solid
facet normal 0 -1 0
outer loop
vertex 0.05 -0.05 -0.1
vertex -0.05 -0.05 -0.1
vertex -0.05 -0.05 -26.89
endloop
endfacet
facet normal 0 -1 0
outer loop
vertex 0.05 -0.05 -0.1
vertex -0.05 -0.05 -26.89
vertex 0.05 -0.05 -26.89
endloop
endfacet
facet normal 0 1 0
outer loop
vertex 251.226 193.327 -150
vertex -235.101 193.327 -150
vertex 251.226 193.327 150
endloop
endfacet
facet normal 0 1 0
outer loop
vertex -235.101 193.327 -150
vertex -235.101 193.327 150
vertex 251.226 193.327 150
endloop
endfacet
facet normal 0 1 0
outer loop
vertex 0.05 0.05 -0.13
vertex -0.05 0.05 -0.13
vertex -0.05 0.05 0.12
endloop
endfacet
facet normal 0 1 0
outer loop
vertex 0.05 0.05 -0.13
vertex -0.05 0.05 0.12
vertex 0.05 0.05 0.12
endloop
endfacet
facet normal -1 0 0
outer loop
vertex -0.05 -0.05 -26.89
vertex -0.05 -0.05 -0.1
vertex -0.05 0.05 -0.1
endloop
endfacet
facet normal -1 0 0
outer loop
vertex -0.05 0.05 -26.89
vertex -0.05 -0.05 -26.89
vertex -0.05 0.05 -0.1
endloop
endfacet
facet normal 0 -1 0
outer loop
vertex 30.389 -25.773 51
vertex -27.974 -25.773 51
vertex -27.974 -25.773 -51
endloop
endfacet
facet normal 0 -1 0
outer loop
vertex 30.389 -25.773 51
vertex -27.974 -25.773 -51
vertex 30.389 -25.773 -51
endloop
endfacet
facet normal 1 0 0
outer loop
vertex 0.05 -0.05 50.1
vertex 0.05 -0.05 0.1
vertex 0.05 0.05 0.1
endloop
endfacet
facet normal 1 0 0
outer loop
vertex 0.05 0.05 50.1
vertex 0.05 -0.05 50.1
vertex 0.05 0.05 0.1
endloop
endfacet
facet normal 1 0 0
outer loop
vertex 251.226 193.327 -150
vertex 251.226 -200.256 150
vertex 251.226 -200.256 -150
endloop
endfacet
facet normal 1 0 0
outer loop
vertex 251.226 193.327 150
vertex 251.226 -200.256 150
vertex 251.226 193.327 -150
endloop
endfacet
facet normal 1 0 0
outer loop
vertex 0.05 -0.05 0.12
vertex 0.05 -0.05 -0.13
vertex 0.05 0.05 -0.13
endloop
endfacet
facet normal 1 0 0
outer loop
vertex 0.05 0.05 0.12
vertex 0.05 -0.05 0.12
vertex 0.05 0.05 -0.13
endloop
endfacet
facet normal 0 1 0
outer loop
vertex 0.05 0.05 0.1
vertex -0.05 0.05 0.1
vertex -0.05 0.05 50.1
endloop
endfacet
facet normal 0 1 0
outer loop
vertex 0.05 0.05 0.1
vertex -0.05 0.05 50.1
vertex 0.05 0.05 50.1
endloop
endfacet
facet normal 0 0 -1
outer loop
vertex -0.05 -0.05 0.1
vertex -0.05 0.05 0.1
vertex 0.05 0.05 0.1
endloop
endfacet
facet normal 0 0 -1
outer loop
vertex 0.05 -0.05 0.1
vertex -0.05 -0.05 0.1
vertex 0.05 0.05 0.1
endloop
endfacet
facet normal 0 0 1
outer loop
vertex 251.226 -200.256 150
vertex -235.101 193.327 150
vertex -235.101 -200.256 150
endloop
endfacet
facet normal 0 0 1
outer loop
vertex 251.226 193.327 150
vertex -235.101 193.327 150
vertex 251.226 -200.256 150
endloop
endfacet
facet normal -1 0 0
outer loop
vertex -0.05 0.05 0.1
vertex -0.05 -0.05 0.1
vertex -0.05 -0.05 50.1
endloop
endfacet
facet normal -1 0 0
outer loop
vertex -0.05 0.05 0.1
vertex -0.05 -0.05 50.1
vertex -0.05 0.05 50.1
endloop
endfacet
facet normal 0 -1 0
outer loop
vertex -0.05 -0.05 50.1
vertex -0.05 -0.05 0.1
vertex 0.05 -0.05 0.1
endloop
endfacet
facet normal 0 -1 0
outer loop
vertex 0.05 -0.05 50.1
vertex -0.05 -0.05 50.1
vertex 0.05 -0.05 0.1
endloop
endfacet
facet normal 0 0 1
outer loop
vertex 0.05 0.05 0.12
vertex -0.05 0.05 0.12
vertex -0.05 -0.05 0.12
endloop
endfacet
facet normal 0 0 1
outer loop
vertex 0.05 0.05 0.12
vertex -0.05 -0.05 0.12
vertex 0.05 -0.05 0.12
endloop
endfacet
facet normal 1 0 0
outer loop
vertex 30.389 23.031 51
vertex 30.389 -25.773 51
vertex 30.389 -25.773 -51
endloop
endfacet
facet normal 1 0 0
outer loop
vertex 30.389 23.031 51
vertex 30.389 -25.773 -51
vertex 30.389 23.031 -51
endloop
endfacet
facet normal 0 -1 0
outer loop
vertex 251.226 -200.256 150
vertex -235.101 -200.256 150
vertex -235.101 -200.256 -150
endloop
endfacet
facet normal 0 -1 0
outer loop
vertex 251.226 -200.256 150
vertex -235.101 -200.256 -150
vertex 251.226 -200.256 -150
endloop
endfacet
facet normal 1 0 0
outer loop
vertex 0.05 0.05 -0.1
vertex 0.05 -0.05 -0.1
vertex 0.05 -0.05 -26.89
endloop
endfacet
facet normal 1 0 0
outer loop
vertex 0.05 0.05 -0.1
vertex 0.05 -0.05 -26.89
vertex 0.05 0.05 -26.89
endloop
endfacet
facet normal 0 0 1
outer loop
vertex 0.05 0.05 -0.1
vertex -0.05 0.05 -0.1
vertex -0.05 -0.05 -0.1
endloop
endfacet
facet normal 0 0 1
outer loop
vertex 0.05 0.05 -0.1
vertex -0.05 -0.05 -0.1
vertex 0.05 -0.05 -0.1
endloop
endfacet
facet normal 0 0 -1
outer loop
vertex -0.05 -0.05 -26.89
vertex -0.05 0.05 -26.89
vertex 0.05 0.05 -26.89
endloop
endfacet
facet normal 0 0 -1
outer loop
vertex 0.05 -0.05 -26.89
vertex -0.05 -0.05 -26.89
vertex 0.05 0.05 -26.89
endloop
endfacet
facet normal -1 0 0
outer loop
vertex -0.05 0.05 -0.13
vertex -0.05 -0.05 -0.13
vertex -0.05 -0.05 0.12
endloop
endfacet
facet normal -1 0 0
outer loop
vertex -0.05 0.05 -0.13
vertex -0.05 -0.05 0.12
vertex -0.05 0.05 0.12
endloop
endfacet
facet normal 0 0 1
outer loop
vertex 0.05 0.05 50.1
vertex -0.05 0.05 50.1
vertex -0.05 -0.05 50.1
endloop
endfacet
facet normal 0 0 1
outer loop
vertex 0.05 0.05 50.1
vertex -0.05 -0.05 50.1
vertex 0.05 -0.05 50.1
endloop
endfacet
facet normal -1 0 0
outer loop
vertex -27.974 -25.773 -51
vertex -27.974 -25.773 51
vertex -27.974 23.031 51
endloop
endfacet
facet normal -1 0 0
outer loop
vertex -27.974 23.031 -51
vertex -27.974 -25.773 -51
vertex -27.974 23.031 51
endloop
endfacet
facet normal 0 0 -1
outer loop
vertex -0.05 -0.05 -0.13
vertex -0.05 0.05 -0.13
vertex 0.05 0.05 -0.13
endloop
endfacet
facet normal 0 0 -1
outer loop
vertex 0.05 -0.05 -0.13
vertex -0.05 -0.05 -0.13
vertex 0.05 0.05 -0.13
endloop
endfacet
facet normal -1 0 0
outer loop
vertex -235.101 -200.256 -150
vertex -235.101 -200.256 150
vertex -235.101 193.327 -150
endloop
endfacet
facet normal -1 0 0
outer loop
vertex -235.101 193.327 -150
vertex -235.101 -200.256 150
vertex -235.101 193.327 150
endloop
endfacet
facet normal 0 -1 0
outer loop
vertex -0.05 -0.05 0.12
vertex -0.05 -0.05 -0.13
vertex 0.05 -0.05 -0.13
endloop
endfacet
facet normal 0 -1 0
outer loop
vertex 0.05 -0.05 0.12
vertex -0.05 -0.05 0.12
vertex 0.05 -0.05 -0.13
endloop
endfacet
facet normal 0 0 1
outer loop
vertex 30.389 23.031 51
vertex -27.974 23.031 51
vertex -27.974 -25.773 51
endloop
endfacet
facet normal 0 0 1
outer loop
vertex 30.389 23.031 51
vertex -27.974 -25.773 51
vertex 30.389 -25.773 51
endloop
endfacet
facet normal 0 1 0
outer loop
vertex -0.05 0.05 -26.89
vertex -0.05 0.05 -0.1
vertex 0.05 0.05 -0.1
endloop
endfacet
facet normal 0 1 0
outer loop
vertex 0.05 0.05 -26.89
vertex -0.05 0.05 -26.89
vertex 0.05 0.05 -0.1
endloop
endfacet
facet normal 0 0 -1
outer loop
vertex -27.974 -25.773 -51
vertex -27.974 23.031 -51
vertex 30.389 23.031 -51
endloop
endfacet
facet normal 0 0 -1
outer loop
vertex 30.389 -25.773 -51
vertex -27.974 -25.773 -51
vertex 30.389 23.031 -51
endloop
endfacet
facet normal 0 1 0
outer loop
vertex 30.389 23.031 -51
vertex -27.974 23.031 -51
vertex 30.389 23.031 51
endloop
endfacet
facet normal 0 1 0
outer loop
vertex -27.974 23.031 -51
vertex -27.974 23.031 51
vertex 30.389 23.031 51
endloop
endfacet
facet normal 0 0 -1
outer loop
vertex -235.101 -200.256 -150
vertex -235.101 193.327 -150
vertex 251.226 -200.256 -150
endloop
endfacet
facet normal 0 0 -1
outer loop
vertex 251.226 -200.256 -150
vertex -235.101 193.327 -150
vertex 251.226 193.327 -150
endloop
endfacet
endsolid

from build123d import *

# Parameters (mm, degrees)
SKETCH_W         = 0.1
SKETCH_H         = 0.1
EXTRUDE_DEPTH    = 50
SKETCH001_W      = 0.1
SKETCH001_H      = 0.1
EXTRUDE001_DEPTH = 26.79
EXTRUDE002_DEPTH = 0.25
SKETCH013_W      = 486.32753
SKETCH013_H      = 393.582382
EXTRUDE003_DEPTH = 150
SKETCH014_W      = 58.362802
SKETCH014_H      = 48.80336
EXTRUDE004_DEPTH = 51


with BuildPart() as top_part:
    # Sketch → Extrude (new body)
    with BuildSketch(Plane.XY.offset(0.1)):
        Rectangle(SKETCH_W, SKETCH_H)
    extrude(amount=EXTRUDE_DEPTH)


with BuildPart() as bottom_part:
    # Sketch001 → Extrude001 (new body)
    with BuildSketch(Plane.XY.offset(-0.1)):
        Rectangle(SKETCH001_W, SKETCH001_H)
    extrude(amount=-EXTRUDE001_DEPTH)


with BuildPart() as port_in:
    # Sketch001 → Extrude002 (new body)
    with BuildSketch(Plane.XY.offset(-0.1)):
        Rectangle(SKETCH001_W, SKETCH001_H)
    extrude(amount=EXTRUDE002_DEPTH)


with BuildPart() as port_in_1:
    # Extrude002 placement: moved
    add(port_in.part.moved(Location((0, 0, -0.03))))


with BuildPart() as simbox:
    # Sketch013 → Extrude003 (new body, symmetric)
    with BuildSketch(Plane.XY):
        with Locations((8.062431, -3.464378)):
            Rectangle(SKETCH013_W, SKETCH013_H)
    extrude(amount=EXTRUDE003_DEPTH, both=True)


with BuildPart() as nf2ff_box:
    # Sketch014 → Extrude004 (new body, symmetric)
    with BuildSketch(Plane.XY):
        with Locations((1.207156, -1.371159)):
            Rectangle(SKETCH014_W, SKETCH014_H)
    extrude(amount=EXTRUDE004_DEPTH, both=True)


solid = Compound([top_part.part, bottom_part.part, port_in_1.part, simbox.part, nf2ff_box.part])
